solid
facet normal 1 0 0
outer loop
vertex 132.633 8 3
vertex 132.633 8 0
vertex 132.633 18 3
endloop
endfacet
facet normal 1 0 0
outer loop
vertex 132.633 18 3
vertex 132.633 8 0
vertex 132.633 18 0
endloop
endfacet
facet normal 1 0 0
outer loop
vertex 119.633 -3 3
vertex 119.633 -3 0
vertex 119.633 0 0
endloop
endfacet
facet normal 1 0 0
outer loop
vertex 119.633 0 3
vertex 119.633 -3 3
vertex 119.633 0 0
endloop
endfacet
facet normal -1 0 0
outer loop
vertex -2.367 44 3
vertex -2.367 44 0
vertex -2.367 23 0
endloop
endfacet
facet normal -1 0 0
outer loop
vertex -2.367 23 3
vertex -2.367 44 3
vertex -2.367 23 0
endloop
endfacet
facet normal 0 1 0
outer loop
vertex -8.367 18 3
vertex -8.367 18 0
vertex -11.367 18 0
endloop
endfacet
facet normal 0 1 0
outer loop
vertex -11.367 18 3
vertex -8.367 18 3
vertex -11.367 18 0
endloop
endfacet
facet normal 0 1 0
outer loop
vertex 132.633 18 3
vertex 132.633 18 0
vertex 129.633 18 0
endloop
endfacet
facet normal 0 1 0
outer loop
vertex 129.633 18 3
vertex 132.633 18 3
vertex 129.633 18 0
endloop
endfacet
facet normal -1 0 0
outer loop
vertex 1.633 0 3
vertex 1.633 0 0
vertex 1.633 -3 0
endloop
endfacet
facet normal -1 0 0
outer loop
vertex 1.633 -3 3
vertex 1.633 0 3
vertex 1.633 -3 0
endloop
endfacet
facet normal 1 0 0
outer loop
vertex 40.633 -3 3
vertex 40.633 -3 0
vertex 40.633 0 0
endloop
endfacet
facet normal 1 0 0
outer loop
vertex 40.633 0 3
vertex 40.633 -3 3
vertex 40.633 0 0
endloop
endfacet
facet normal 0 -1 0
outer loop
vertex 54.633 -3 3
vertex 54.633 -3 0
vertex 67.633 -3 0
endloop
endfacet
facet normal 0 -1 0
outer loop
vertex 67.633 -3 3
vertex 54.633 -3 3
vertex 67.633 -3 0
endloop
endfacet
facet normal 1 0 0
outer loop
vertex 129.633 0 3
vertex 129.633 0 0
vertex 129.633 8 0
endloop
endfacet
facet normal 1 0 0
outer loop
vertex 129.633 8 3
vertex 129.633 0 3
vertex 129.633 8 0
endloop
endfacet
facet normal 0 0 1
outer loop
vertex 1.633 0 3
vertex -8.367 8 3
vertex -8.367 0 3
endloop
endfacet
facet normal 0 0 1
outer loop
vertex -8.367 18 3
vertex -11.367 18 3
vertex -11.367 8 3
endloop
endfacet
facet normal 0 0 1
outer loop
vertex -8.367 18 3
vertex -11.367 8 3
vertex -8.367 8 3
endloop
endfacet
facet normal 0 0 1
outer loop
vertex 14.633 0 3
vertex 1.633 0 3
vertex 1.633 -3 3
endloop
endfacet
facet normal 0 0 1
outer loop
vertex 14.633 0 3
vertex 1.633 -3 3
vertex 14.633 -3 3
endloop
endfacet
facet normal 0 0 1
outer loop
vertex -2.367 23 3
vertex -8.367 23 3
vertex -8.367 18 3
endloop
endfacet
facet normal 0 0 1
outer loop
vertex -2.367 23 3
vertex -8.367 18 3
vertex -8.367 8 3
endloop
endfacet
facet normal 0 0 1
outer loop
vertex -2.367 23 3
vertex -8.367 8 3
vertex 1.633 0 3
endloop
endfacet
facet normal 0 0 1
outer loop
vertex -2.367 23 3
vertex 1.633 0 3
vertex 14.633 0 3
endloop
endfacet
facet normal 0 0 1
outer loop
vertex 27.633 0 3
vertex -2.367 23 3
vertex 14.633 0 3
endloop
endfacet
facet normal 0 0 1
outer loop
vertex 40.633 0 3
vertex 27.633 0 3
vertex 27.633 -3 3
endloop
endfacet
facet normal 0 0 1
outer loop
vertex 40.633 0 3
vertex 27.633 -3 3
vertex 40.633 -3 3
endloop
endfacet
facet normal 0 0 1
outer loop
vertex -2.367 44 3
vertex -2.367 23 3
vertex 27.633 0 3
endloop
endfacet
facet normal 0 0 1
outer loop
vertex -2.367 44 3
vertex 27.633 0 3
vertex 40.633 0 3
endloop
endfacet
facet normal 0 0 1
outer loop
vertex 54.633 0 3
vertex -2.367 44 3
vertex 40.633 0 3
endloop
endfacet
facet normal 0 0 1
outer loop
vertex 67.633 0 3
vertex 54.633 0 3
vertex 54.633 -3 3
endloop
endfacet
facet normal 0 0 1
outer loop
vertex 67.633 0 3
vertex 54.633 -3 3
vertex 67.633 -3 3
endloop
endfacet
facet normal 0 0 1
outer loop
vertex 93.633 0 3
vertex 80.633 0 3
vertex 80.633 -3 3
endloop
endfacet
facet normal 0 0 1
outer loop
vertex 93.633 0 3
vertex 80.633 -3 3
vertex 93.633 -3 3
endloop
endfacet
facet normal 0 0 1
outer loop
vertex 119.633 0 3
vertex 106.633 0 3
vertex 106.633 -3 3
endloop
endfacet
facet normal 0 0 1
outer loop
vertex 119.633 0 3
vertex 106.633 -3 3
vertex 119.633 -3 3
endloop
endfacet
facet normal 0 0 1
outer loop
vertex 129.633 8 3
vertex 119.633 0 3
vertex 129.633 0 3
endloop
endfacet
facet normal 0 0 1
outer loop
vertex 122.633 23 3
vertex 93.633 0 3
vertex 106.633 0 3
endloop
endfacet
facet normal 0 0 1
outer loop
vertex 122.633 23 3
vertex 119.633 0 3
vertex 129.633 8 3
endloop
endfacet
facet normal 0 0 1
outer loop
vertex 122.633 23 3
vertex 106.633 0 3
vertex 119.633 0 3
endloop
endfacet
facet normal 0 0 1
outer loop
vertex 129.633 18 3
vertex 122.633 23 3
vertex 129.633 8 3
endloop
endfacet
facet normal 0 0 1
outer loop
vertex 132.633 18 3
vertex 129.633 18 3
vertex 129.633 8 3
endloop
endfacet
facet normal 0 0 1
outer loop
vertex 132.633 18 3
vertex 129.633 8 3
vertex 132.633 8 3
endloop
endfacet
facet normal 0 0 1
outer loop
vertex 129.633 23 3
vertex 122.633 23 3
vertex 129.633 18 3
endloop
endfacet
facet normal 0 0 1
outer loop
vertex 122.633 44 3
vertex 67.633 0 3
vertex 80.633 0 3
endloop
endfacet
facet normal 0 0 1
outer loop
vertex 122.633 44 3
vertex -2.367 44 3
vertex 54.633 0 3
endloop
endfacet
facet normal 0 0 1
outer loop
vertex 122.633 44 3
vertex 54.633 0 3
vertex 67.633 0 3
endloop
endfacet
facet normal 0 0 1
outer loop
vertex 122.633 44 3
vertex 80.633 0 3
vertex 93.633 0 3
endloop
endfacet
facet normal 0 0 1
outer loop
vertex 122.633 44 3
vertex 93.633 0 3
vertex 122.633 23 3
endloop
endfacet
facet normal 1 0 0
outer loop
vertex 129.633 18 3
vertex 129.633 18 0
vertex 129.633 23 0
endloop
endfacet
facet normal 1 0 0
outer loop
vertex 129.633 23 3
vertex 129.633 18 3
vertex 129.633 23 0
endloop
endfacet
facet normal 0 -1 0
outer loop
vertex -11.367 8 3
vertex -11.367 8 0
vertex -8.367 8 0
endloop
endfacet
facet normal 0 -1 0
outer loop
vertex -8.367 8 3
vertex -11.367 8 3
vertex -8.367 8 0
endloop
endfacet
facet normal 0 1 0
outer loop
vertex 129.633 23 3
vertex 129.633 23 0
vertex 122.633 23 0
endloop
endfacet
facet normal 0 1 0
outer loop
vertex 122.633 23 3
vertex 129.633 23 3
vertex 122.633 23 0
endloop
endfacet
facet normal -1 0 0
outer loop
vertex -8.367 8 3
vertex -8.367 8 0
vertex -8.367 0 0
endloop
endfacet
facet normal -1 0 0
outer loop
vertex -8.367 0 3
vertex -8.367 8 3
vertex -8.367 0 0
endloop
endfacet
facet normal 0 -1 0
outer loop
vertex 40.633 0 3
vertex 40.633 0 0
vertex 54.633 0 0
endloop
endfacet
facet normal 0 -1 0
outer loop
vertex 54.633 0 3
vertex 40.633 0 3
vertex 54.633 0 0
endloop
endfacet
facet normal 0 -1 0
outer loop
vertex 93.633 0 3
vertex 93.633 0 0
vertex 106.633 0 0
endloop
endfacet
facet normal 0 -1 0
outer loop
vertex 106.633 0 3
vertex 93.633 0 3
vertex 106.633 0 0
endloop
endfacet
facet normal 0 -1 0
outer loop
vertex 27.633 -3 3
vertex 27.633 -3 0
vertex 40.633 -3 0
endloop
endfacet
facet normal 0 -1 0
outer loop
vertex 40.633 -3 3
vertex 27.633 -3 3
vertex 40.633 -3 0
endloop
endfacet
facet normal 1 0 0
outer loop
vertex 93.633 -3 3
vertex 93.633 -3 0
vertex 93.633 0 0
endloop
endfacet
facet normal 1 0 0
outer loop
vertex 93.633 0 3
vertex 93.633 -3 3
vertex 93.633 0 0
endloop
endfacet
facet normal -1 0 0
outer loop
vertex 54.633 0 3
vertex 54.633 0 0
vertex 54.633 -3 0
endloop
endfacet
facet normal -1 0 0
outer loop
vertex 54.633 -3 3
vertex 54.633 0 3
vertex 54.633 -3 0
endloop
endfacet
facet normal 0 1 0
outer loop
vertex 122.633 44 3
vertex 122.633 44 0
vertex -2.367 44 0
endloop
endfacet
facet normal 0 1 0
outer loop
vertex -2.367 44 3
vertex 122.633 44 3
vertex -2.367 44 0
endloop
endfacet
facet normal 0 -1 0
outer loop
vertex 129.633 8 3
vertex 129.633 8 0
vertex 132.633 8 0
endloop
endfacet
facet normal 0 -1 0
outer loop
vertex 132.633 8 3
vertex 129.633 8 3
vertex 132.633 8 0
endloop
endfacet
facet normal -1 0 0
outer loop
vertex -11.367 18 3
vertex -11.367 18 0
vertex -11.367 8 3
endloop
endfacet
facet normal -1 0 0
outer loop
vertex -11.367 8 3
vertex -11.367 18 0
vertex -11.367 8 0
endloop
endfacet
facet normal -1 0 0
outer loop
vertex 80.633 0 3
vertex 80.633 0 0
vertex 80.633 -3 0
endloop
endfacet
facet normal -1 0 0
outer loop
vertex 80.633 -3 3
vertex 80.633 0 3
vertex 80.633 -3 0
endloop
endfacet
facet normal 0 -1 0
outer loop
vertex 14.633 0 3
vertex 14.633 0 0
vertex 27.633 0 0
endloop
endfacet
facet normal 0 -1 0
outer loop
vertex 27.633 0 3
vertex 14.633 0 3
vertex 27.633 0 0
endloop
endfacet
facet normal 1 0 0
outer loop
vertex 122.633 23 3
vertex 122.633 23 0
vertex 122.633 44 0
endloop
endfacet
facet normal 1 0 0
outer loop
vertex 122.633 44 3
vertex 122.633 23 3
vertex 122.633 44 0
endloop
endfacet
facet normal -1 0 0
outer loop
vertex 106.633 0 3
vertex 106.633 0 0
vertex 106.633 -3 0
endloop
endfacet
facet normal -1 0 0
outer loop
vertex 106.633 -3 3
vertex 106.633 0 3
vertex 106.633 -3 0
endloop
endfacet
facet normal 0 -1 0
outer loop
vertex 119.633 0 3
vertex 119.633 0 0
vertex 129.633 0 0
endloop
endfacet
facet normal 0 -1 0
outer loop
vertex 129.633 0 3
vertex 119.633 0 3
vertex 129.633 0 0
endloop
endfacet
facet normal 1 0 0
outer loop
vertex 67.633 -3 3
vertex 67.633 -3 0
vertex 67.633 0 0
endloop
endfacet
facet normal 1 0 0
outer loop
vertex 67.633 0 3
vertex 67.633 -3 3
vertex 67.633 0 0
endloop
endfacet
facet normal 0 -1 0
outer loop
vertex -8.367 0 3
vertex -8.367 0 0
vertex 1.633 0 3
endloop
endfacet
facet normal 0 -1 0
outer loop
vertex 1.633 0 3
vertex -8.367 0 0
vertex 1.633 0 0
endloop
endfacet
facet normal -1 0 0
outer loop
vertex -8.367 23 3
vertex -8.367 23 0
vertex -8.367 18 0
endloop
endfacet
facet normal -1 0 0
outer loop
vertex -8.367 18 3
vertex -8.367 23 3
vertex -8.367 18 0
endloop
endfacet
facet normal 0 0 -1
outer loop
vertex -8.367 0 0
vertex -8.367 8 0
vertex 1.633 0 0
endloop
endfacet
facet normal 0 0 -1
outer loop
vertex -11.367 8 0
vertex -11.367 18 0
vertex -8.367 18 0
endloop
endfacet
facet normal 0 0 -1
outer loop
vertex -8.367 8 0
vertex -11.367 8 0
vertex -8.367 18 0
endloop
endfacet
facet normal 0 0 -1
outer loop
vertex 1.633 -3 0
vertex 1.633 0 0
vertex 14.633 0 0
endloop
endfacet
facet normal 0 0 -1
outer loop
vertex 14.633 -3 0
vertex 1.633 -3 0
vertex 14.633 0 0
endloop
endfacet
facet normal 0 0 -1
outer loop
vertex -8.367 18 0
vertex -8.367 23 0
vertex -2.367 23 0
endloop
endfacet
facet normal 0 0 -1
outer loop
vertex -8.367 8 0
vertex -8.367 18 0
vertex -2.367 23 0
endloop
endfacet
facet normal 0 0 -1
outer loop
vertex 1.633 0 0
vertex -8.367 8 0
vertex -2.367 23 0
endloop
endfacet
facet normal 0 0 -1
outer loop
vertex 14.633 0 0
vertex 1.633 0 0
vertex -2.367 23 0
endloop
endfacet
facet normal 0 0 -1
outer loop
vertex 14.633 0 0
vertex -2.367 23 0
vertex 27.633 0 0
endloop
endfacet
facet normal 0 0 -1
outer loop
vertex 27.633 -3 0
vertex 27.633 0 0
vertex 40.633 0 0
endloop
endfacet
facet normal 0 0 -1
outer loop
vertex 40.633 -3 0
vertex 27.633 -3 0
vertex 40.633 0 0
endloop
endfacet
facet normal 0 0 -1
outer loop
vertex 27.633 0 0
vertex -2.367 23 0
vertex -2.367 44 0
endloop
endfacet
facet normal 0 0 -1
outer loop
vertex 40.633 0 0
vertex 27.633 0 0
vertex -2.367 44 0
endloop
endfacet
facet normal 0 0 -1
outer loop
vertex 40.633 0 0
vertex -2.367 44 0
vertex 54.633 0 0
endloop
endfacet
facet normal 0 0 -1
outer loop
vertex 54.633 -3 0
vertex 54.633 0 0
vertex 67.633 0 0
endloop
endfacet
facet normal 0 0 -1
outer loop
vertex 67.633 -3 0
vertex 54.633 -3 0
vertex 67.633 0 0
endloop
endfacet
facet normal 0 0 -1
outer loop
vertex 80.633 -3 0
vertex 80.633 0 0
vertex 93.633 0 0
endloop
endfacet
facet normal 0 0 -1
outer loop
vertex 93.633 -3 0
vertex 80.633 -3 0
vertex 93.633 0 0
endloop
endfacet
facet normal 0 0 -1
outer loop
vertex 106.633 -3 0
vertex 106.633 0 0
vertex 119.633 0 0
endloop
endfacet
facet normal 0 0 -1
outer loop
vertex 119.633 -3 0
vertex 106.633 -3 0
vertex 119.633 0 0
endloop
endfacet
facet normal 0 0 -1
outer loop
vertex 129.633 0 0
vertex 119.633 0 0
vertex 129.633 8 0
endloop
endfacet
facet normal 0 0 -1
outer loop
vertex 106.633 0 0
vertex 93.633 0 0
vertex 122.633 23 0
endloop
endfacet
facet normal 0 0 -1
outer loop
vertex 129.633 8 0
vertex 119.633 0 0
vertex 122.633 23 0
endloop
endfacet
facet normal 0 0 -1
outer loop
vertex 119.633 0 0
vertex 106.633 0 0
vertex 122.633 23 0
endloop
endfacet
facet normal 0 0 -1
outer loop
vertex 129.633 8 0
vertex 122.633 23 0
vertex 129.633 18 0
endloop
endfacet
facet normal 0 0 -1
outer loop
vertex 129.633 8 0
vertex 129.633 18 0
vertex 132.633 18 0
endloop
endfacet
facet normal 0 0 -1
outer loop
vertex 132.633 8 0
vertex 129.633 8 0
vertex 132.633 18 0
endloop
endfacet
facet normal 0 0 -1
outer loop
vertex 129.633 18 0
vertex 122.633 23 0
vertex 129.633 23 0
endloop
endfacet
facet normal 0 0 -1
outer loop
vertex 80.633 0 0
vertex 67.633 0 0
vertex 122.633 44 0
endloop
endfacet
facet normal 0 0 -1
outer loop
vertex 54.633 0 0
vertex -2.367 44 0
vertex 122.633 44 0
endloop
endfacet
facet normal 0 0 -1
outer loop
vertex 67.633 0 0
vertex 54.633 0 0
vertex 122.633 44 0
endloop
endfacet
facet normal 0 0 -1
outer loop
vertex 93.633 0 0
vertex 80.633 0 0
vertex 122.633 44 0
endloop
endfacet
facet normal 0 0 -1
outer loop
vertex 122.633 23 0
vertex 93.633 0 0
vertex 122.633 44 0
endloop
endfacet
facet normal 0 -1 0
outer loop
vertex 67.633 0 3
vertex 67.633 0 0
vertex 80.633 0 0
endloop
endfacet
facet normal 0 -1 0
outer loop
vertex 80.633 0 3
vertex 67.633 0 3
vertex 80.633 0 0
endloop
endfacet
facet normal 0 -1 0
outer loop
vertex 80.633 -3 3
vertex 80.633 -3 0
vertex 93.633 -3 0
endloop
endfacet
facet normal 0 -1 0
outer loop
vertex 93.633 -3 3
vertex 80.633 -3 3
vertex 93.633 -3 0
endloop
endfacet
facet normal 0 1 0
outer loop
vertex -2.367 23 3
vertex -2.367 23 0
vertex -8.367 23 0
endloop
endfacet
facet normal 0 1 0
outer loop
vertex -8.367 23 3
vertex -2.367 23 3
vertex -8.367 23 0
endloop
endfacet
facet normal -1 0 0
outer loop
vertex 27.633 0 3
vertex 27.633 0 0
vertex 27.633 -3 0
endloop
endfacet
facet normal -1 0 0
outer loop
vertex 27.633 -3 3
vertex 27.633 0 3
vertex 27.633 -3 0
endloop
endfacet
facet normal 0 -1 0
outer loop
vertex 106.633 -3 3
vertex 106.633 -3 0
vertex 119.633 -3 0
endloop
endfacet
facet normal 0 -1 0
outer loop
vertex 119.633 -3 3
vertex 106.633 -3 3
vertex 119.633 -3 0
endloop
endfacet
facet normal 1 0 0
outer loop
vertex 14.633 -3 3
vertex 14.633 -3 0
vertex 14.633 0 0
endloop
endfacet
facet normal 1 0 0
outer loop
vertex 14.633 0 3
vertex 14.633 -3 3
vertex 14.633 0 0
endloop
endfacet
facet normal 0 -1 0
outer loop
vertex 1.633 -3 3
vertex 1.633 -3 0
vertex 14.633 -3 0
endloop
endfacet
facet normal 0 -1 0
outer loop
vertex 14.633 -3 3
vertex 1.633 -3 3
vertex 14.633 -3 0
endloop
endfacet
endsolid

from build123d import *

# Parameters (mm, degrees)
BOSS_EXTRUDE1_DEPTH = 3


with BuildPart() as part:
    # Sketch1 → Boss-Extrude1 (new body)
    with BuildSketch(Plane.XY):
        Polygon((14.633144841, 0), (27.633144841, 0), (27.633144841, -3), (40.633144841, -3), (40.633144841, 0), (54.633144841, 0), (54.633144841, -3), (67.633144841, -3), (67.633144841, 0), (80.633144841, 0), (80.633144841, -3), (93.633144841, -3), (93.633144841, 0), (106.633144841, 0), (106.633144841, -3), (119.633144841, -3), (119.633144841, 0), (125, 0), (129.633144841, 0), (129.633144841, 8), (132.633144841, 8), (132.633144841, 18), (129.633144841, 18), (129.633144841, 23), (122.633144841, 23), (122.633144841, 44), (-2.366855159, 44), (-2.366855159, 23), (-8.366855159, 23), (-8.366855159, 18), (-11.366855159, 18), (-11.366855159, 8), (-8.366855159, 8), (-8.366855159, 0), (0, 0), (1.633144841, 0), (1.633144841, -3), (14.633144841, -3), align=None)
    extrude(amount=BOSS_EXTRUDE1_DEPTH)


solid = part.part
